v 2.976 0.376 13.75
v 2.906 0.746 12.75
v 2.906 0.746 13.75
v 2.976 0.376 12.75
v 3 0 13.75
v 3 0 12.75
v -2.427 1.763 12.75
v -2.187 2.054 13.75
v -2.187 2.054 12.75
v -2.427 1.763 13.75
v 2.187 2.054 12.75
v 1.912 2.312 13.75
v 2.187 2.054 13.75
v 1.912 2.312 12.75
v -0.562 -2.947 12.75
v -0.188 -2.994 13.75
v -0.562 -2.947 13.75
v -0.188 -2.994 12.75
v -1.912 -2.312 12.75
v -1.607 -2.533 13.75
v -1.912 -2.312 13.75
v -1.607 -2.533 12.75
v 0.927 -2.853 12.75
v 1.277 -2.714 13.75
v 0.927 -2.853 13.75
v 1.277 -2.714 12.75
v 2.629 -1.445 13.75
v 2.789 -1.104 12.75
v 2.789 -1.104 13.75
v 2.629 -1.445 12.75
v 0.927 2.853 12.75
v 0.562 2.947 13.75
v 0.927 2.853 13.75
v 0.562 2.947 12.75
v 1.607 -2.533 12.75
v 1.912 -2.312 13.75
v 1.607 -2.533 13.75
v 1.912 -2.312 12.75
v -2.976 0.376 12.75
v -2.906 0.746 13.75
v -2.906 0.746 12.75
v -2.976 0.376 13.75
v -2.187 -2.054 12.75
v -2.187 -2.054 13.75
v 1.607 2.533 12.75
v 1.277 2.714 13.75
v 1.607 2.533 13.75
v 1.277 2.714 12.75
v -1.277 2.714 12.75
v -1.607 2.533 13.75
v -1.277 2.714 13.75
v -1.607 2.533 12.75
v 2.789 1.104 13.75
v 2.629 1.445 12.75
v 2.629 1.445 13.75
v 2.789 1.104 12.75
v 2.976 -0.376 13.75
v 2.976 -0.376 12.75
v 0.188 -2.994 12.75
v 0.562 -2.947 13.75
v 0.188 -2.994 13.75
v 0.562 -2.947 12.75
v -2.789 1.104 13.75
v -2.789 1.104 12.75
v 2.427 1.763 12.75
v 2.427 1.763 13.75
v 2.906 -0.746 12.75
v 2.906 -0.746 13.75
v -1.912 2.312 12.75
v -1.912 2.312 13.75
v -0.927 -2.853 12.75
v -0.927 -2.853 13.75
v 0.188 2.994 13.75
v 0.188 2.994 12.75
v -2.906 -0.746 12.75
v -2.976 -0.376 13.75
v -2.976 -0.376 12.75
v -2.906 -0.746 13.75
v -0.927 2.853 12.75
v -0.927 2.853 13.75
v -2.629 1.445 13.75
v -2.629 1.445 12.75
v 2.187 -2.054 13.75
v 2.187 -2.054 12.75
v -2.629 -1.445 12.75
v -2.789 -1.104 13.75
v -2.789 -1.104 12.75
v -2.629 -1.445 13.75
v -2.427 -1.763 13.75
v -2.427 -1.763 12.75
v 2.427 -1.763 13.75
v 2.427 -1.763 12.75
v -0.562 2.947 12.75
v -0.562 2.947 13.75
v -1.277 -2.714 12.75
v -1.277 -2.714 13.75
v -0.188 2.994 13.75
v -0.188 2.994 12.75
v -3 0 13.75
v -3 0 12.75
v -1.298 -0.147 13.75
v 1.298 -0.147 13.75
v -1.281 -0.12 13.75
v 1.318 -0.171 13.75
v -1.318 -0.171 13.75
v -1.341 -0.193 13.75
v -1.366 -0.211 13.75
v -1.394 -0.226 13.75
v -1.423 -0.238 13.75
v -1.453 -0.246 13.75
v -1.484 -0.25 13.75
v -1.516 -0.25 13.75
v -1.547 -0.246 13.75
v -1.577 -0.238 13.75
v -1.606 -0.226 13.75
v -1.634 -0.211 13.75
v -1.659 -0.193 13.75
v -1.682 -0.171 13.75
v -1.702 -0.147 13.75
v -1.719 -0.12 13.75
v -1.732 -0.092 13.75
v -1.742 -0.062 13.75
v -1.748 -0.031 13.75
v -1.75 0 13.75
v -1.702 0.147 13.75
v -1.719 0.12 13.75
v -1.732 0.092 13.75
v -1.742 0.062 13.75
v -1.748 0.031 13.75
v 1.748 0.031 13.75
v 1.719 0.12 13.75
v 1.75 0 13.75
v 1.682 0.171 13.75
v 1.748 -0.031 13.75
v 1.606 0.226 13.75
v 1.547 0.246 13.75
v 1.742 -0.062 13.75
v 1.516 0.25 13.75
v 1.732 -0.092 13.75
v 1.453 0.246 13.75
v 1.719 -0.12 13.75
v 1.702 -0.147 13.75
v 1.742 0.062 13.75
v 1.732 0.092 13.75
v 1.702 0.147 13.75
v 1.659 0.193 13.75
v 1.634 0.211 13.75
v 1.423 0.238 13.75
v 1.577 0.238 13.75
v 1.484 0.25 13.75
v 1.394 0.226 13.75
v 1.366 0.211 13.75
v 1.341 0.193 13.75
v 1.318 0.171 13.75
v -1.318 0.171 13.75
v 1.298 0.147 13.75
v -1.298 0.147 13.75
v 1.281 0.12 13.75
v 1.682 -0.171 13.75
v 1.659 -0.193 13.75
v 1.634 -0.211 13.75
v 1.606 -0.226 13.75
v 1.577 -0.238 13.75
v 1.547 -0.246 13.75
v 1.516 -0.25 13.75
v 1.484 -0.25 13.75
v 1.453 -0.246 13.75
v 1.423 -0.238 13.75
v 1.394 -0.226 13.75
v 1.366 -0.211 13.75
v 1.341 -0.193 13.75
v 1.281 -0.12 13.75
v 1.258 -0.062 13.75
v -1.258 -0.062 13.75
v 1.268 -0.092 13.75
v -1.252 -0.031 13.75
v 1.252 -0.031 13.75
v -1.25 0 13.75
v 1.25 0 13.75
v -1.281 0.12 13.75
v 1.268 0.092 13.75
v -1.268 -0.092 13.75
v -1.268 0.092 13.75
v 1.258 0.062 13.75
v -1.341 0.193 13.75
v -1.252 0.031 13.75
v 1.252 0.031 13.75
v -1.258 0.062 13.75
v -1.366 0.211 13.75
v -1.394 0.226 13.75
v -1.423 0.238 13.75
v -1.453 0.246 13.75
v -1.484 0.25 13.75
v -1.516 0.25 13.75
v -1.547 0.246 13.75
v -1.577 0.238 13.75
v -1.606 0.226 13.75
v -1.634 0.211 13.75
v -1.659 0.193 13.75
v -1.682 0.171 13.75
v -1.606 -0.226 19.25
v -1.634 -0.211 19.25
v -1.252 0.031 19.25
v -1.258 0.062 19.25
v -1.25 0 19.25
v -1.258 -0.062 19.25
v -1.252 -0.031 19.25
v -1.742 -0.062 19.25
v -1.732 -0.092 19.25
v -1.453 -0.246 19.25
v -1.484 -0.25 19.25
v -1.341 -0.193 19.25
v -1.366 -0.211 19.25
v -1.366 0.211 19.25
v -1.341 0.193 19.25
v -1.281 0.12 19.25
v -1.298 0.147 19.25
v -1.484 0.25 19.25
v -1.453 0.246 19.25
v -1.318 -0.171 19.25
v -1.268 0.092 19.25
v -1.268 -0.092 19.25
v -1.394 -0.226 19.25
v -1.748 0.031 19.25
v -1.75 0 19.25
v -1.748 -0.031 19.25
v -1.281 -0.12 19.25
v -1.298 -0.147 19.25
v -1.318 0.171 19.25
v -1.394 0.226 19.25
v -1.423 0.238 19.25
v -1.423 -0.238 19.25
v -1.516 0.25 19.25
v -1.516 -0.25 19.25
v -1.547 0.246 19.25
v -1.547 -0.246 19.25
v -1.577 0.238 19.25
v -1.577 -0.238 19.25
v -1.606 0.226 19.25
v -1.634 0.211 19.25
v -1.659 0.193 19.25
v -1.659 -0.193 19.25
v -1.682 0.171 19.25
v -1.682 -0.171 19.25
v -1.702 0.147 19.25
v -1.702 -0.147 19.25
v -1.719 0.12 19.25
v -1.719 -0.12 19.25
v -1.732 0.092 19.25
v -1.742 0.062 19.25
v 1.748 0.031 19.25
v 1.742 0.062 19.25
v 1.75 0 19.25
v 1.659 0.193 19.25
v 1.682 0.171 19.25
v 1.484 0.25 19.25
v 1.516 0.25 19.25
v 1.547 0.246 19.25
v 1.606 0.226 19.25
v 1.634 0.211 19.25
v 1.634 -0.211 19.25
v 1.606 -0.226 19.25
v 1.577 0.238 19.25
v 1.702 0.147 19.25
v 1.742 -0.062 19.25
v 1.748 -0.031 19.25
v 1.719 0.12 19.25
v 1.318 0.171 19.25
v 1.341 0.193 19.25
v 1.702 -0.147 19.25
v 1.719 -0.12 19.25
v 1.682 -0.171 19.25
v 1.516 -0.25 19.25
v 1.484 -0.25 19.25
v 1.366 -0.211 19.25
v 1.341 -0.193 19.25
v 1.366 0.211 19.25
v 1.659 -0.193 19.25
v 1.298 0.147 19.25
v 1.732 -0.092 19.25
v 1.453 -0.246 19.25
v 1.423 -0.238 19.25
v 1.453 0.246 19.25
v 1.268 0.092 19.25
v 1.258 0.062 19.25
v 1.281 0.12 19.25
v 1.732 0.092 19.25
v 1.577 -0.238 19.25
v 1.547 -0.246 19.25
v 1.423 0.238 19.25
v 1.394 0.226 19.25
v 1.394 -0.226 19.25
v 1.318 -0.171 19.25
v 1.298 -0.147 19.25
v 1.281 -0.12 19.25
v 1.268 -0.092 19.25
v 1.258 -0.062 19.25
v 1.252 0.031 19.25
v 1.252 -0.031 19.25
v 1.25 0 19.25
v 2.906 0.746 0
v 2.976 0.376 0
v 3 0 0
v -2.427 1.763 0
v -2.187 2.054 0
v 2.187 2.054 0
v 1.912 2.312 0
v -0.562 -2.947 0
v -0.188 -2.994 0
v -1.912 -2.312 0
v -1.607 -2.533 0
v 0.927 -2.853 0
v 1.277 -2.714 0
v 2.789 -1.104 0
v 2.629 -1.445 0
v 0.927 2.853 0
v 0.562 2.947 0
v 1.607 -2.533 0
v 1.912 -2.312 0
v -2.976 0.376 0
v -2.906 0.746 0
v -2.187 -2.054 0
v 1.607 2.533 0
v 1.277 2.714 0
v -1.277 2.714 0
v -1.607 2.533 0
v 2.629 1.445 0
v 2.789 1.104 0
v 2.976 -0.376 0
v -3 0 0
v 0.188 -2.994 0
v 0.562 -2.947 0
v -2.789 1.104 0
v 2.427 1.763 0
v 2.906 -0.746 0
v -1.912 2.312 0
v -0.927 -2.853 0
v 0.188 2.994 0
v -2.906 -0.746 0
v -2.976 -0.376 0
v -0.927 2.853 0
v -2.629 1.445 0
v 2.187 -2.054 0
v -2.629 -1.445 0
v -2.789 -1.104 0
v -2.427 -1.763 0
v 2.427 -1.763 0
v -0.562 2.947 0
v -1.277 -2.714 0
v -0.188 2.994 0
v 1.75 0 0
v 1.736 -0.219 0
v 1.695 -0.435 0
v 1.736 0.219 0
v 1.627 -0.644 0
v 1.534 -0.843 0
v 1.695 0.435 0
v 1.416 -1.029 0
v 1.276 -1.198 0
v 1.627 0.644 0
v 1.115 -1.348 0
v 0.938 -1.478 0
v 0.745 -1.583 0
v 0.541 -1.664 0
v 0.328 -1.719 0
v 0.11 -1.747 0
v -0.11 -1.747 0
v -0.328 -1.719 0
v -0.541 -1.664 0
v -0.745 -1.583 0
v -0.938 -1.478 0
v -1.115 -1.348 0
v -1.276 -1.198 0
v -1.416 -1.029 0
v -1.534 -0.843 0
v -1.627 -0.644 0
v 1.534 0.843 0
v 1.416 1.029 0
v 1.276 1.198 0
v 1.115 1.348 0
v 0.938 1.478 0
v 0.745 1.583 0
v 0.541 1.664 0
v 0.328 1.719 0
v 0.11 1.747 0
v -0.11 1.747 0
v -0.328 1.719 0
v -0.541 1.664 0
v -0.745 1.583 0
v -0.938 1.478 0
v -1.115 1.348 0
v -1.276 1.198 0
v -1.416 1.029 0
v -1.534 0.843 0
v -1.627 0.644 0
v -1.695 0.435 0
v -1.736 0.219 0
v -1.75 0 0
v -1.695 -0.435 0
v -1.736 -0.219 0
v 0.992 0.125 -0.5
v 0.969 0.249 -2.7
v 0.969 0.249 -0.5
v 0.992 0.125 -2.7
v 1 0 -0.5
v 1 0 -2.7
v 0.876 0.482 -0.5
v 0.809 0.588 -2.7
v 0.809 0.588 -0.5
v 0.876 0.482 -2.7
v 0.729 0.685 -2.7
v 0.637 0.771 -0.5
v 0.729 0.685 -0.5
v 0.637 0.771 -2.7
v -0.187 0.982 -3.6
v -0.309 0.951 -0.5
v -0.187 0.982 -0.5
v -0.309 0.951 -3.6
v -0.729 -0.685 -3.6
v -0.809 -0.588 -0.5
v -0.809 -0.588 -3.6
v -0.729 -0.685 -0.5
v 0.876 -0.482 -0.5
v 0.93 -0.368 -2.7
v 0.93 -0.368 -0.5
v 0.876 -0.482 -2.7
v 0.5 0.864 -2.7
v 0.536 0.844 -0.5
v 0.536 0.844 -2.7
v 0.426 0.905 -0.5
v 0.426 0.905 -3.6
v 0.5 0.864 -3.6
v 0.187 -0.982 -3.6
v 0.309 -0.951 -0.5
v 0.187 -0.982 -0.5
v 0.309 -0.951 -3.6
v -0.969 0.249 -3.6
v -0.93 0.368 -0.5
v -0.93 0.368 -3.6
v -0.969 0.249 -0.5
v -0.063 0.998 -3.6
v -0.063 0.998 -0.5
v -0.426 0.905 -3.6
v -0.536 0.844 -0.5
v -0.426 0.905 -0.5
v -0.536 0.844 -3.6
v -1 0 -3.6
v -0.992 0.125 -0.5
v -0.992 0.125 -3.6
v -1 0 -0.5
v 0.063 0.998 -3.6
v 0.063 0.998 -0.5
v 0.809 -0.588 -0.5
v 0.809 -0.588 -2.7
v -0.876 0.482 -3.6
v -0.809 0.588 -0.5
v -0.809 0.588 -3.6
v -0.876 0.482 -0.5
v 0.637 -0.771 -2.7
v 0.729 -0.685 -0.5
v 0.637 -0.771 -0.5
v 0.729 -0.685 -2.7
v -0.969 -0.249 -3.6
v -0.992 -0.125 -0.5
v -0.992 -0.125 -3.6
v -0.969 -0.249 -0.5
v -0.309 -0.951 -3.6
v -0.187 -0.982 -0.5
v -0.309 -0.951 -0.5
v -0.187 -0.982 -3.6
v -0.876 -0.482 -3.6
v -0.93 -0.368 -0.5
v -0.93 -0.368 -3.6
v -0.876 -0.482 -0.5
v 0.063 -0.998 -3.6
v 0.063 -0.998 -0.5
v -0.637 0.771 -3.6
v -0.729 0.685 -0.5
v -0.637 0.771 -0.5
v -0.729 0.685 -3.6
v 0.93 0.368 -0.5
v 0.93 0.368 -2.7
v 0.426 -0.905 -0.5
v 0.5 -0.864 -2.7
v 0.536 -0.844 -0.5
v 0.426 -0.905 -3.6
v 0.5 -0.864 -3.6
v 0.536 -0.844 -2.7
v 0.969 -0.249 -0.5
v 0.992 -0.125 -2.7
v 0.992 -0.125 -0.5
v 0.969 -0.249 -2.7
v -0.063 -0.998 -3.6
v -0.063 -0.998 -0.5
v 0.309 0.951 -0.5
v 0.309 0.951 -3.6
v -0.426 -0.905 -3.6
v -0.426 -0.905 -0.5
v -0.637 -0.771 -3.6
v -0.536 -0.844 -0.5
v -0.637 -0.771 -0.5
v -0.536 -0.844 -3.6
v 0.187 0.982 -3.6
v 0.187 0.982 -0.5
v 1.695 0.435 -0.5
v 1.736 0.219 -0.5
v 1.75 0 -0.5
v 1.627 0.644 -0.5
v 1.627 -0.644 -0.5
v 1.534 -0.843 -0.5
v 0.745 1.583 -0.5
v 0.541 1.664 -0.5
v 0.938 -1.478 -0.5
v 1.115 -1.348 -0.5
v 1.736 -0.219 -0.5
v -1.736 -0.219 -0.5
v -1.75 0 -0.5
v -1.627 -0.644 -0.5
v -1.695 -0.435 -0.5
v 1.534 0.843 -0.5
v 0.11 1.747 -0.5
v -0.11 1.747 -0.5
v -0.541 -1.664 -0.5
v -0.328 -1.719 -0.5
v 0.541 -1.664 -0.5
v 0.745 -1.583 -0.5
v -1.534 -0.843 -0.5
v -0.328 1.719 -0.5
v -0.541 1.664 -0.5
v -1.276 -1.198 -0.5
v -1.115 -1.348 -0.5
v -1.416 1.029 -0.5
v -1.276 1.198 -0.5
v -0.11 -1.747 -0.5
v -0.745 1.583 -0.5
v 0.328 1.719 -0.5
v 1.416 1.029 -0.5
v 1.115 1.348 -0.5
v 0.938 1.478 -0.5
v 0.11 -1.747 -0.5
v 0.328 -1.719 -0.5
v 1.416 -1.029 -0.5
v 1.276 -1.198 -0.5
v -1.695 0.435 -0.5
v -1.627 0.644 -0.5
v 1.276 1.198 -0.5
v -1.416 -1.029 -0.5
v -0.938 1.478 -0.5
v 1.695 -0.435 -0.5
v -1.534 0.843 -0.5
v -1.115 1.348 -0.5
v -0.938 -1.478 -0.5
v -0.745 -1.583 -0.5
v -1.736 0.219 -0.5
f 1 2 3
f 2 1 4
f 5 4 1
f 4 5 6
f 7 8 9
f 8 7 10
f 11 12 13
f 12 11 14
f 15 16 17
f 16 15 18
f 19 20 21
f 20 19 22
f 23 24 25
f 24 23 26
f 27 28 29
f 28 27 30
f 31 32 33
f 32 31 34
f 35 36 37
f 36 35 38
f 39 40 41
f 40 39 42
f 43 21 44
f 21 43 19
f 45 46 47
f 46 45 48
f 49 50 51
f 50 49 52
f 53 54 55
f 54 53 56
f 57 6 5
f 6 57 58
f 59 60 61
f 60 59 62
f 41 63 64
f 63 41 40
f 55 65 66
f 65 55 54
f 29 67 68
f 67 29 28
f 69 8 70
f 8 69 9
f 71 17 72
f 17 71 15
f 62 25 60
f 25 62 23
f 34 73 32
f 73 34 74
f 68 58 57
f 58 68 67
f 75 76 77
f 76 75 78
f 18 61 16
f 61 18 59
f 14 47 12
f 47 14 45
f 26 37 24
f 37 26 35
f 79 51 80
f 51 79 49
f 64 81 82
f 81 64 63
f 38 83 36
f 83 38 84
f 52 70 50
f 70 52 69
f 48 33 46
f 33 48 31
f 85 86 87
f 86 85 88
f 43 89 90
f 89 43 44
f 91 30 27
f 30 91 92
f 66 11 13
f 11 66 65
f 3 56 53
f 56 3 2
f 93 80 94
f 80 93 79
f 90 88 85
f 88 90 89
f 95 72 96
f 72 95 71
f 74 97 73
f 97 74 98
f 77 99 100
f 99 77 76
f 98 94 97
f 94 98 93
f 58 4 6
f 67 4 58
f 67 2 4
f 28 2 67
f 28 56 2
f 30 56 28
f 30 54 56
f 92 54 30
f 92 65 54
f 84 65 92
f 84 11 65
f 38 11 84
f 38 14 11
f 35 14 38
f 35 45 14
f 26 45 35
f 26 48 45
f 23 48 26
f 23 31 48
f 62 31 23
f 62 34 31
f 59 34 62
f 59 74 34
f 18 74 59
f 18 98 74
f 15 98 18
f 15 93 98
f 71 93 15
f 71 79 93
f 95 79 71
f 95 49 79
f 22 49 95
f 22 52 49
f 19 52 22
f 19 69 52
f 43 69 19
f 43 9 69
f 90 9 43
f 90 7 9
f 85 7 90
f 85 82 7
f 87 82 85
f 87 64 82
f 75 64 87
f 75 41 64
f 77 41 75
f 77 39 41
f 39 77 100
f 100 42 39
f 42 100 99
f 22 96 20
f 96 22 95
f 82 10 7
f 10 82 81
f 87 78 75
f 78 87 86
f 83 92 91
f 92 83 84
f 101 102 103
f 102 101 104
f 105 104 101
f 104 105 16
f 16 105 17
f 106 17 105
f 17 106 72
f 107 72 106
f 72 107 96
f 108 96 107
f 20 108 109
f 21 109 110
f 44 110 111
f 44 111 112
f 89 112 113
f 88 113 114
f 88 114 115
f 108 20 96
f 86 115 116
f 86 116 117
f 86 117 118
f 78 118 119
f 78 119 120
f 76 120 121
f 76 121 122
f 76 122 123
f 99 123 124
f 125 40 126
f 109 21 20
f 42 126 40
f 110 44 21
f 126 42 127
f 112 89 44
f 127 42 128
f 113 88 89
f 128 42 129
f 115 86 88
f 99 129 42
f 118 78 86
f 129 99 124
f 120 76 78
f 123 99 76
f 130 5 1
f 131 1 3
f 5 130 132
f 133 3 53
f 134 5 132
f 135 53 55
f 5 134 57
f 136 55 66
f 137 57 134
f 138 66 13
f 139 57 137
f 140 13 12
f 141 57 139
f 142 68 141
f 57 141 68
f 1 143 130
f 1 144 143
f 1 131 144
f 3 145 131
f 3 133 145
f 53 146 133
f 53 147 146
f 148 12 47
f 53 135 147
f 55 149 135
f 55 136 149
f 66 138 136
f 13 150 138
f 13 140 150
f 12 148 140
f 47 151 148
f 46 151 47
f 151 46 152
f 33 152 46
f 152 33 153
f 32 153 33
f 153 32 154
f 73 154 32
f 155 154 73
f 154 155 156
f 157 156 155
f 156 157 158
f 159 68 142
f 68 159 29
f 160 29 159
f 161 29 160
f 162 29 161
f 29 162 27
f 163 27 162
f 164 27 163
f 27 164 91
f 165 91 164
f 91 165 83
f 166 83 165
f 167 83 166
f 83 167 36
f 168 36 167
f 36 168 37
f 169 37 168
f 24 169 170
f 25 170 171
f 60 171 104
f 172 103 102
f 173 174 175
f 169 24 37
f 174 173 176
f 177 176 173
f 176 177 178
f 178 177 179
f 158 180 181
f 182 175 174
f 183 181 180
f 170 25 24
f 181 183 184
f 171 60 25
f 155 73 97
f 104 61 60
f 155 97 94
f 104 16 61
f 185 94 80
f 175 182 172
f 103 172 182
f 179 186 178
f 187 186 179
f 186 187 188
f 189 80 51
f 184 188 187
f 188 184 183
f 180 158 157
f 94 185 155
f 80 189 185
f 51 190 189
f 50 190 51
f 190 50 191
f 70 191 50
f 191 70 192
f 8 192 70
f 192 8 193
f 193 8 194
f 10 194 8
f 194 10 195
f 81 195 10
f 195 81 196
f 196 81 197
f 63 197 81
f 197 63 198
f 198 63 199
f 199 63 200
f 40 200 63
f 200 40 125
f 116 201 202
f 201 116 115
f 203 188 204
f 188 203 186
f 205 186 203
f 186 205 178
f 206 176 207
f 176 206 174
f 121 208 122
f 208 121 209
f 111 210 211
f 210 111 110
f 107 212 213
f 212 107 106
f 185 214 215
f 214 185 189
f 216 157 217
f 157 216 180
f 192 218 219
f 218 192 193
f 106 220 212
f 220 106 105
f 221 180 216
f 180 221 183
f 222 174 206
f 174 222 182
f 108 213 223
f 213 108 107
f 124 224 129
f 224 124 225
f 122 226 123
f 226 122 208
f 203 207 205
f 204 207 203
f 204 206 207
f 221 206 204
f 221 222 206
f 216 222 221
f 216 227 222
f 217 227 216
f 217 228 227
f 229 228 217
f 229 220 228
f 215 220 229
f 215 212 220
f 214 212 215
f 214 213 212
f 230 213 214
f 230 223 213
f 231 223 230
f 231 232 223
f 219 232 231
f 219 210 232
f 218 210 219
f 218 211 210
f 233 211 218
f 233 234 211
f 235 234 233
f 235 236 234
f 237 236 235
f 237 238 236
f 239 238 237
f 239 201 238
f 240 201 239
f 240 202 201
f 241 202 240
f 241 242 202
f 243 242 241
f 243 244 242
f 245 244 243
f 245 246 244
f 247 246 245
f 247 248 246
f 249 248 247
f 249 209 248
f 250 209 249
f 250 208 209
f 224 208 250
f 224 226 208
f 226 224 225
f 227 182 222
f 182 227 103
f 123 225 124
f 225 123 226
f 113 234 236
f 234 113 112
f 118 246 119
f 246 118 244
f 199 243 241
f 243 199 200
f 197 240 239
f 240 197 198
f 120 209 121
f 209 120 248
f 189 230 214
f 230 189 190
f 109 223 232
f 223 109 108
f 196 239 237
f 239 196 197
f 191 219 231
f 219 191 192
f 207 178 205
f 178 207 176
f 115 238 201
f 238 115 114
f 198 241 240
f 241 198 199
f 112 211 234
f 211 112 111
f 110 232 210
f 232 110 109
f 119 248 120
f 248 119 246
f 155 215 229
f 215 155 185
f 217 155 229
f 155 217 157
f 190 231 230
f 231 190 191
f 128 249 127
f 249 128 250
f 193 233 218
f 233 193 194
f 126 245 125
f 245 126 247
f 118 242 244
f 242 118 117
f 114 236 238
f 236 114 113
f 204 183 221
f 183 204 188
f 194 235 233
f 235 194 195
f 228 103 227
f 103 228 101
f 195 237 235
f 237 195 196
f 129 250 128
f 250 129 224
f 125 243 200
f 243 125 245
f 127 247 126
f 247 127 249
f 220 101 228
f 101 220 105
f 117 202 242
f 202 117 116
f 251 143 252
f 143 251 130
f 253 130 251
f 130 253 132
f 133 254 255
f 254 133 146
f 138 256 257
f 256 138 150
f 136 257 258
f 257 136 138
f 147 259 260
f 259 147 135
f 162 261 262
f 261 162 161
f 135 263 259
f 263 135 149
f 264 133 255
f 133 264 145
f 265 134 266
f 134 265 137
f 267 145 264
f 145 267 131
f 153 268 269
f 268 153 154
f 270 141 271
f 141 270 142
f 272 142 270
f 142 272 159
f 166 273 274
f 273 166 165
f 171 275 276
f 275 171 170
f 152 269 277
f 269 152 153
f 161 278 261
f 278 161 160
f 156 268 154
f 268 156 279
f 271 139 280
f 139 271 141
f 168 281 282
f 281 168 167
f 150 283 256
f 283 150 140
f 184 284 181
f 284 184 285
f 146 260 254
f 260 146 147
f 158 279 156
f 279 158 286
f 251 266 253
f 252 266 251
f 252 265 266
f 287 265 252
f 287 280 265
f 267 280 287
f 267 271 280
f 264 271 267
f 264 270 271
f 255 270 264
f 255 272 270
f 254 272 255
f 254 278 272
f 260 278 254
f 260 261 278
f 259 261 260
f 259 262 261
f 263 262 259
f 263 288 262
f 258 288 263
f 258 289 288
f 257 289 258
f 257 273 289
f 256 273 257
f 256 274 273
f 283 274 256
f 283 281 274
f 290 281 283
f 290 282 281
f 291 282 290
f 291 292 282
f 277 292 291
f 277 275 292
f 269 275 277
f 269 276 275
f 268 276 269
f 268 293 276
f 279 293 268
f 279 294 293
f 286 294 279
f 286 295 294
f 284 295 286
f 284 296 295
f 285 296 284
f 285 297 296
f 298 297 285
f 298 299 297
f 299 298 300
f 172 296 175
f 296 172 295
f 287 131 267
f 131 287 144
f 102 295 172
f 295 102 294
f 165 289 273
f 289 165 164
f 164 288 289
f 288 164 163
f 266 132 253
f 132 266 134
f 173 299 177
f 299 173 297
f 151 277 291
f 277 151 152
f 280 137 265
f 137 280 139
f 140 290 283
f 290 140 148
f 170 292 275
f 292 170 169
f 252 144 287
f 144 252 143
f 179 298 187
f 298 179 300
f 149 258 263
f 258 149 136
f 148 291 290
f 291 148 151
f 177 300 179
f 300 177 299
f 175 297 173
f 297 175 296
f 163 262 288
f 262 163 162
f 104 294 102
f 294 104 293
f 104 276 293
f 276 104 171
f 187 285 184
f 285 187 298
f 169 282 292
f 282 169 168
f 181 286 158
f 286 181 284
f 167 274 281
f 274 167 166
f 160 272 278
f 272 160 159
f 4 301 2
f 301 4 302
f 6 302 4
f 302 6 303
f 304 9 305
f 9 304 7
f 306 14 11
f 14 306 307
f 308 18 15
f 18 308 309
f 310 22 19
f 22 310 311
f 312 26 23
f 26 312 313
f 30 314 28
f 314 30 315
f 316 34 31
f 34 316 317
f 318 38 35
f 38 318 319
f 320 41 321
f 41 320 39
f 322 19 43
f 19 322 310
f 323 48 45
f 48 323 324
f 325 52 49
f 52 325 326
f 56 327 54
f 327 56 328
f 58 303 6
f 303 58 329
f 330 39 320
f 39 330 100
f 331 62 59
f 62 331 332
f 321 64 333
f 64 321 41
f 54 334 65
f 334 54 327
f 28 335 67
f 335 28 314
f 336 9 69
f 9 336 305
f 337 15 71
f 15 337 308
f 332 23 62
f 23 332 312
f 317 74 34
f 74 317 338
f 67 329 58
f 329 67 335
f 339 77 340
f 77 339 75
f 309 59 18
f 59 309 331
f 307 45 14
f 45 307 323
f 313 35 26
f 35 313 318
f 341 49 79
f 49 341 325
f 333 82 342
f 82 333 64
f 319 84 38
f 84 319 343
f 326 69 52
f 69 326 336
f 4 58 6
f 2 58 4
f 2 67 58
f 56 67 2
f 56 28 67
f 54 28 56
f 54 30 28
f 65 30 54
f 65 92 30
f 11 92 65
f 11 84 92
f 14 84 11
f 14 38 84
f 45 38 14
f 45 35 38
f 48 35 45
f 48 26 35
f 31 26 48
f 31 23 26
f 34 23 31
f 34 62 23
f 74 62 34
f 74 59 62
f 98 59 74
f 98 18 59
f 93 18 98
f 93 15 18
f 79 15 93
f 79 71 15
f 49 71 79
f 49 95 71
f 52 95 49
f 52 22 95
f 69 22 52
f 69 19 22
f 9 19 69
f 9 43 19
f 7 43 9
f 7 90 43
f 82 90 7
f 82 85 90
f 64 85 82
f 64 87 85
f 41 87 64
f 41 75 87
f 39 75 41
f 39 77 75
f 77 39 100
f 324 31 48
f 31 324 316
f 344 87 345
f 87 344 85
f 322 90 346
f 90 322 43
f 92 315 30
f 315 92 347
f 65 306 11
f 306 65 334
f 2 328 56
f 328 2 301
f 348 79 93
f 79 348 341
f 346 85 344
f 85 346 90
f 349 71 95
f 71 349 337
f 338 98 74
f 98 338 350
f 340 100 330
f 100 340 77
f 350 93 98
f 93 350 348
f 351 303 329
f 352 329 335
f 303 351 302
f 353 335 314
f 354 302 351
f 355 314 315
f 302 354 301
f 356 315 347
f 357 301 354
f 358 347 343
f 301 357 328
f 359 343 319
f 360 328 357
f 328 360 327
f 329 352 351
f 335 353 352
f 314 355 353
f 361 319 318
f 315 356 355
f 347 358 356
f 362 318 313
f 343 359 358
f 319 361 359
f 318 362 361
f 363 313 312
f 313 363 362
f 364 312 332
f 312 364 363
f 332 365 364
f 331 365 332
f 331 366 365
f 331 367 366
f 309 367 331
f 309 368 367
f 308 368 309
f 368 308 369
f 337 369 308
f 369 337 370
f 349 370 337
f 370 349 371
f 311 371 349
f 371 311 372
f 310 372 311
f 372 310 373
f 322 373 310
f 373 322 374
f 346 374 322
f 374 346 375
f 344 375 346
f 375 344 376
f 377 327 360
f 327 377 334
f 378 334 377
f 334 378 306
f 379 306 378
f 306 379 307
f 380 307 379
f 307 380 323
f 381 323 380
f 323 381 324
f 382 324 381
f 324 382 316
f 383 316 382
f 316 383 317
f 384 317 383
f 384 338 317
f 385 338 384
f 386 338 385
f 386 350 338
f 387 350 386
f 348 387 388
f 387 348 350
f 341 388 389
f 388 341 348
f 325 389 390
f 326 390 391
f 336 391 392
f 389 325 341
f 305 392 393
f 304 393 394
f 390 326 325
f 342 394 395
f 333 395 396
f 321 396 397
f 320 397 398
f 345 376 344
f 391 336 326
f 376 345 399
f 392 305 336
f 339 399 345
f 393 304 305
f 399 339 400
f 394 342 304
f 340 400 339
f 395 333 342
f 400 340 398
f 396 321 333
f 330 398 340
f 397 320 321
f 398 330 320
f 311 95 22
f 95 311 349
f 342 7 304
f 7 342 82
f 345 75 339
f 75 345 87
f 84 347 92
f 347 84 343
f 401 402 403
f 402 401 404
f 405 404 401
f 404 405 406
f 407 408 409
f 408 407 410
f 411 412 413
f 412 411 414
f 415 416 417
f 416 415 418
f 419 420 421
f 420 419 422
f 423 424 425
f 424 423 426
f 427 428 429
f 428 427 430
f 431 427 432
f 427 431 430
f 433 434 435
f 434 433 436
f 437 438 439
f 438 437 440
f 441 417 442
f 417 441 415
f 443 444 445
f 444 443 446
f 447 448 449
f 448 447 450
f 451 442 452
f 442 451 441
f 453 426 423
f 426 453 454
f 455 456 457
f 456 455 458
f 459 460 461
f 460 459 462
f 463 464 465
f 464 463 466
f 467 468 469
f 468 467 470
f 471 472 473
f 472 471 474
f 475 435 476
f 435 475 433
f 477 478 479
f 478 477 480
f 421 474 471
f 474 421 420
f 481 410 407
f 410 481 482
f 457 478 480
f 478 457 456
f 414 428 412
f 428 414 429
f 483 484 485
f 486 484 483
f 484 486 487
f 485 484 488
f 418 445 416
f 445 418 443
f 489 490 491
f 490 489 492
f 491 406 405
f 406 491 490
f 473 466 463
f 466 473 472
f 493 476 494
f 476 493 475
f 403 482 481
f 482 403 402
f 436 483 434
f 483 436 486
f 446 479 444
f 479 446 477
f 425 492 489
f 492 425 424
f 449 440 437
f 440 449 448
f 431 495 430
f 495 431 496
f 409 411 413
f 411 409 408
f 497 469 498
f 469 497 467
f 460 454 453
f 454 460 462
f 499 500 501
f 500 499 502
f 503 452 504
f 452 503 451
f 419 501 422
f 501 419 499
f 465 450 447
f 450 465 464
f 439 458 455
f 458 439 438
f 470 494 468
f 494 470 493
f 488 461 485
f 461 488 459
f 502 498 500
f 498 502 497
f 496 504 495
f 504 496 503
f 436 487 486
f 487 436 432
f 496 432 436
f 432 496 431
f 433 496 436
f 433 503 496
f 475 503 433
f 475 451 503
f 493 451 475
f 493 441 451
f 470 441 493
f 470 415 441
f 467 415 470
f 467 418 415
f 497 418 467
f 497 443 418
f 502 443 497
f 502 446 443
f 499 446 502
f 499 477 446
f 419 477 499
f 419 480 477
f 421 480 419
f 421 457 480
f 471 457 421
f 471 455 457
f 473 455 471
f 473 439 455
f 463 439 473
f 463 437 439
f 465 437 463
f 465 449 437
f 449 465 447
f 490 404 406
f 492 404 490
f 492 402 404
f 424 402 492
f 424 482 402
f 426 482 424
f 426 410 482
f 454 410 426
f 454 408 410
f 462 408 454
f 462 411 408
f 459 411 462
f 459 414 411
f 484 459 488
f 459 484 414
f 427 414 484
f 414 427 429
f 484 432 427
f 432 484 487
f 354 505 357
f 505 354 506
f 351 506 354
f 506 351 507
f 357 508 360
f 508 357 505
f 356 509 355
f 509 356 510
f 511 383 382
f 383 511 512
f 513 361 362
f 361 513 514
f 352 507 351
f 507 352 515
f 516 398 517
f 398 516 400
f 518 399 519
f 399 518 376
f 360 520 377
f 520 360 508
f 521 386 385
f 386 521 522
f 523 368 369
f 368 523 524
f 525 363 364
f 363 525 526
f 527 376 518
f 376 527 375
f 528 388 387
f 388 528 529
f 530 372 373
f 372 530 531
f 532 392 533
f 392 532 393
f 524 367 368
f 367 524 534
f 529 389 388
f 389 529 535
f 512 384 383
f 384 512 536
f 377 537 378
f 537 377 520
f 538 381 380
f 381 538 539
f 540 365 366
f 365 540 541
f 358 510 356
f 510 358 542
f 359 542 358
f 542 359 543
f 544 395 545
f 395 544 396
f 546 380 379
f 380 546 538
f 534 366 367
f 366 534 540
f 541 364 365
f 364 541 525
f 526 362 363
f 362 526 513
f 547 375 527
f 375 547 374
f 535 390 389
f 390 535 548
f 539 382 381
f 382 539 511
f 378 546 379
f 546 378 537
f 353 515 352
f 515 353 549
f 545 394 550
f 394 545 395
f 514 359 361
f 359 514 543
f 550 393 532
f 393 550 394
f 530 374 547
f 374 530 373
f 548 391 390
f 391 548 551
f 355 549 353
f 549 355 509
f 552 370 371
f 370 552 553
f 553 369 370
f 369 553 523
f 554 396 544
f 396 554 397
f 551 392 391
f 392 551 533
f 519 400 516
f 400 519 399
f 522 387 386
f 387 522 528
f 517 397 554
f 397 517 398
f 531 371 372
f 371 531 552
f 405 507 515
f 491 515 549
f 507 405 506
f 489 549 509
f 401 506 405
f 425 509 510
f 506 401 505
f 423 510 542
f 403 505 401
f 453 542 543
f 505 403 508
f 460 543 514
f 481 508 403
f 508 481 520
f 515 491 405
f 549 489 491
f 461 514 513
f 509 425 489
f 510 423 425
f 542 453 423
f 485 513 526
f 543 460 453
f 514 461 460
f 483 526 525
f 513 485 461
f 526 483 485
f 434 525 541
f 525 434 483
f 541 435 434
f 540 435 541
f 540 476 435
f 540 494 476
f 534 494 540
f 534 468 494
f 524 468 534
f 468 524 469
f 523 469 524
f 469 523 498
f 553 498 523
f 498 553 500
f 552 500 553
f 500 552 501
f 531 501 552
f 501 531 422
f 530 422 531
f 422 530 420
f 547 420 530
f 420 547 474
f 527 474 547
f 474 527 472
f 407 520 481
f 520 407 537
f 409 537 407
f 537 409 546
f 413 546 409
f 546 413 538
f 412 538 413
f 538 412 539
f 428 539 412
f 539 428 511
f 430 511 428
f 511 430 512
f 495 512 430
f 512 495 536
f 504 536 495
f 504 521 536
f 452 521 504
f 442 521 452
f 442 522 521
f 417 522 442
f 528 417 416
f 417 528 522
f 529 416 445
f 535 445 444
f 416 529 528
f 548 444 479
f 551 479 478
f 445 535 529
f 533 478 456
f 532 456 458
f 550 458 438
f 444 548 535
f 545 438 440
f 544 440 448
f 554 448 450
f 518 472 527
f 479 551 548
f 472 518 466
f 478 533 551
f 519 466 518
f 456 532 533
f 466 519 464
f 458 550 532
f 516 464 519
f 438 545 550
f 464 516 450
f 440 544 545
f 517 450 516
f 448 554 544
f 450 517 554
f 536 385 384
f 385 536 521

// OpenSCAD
// 1200r/min DC Motor Model (ZWPD006006-26)
// Based on specifications from diagram

// Main dimensions
motor_body_diameter = 6;  // 6mm body diameter
total_length = 16.35;  // Total length as specified (L=16.35mm)
shaft_diameter = 2;  // 2mm shaft diameter
shaft_length = 3.6;  // 3.6mm shaft length
motor_body_length = total_length - shaft_length;  // Body length = Total length - shaft length
terminal_width = 0.5;  // Width of the terminals (estimated)
terminal_length = 6;  // Length of the terminals (estimated)

// Render settings
$fn = 50;  // Smoothness of curved surfaces

// Main motor body
module motor_body() {
    // Main cylindrical body
    color([0.8, 0.8, 0.8])
    cylinder(d=motor_body_diameter, h=motor_body_length);
    
    // Back cap with wire terminals
    translate([0, 0, motor_body_length]) {
        color([0.3, 0.3, 0.3])
        cylinder(d=motor_body_diameter, h=1);
        
        // Terminals (wires)
        color([0.9, 0, 0])  // Red wire
        translate([-1.5, 0, 0.5])
        cylinder(d=0.5, h=terminal_length);
        
        color([0, 0, 0])  // Black wire
        translate([1.5, 0, 0.5])
        cylinder(d=0.5, h=terminal_length);
    }
}

// Motor shaft with precise D-cut and flange
module motor_shaft() {
    color([0.7, 0.7, 0.7]) {
        // Shaft with D-cut
        translate([0, 0, -shaft_length]) {
            difference() {
                // Basic shaft cylinder
                cylinder(d=shaft_diameter, h=shaft_length);
                
                // D-cut on the shaft (flat side)
                // For a 2mm shaft with 0.5mm depth cut
                translate([shaft_diameter/2 +0.5, 0, 0])
                cube([shaft_diameter, shaft_diameter, shaft_length/2], center=true);
            }
        }
        
        // Flange/collar at the base of the shaft
        translate([0, 0, -0.5])
        cylinder(d=3.5, h=0.5); // A small flange with diameter 3.5mm
    }
}

// Complete motor assembly
module dc_motor() {
    motor_body();
    motor_shaft();
}

// Render the motor
dc_motor();



// Add dimensions for reference
color([0, 0, 0])
translate([-15, 0, 0])
text("Ø6mm", size=1.5);

color([0, 0, 0])
translate([0, -15, -shaft_length/2])
text("Ø2mm", size=1.5);

color([0, 0, 0])
translate([10, 0, motor_body_length/2])
text("L=16.35mm", size=1.5);
